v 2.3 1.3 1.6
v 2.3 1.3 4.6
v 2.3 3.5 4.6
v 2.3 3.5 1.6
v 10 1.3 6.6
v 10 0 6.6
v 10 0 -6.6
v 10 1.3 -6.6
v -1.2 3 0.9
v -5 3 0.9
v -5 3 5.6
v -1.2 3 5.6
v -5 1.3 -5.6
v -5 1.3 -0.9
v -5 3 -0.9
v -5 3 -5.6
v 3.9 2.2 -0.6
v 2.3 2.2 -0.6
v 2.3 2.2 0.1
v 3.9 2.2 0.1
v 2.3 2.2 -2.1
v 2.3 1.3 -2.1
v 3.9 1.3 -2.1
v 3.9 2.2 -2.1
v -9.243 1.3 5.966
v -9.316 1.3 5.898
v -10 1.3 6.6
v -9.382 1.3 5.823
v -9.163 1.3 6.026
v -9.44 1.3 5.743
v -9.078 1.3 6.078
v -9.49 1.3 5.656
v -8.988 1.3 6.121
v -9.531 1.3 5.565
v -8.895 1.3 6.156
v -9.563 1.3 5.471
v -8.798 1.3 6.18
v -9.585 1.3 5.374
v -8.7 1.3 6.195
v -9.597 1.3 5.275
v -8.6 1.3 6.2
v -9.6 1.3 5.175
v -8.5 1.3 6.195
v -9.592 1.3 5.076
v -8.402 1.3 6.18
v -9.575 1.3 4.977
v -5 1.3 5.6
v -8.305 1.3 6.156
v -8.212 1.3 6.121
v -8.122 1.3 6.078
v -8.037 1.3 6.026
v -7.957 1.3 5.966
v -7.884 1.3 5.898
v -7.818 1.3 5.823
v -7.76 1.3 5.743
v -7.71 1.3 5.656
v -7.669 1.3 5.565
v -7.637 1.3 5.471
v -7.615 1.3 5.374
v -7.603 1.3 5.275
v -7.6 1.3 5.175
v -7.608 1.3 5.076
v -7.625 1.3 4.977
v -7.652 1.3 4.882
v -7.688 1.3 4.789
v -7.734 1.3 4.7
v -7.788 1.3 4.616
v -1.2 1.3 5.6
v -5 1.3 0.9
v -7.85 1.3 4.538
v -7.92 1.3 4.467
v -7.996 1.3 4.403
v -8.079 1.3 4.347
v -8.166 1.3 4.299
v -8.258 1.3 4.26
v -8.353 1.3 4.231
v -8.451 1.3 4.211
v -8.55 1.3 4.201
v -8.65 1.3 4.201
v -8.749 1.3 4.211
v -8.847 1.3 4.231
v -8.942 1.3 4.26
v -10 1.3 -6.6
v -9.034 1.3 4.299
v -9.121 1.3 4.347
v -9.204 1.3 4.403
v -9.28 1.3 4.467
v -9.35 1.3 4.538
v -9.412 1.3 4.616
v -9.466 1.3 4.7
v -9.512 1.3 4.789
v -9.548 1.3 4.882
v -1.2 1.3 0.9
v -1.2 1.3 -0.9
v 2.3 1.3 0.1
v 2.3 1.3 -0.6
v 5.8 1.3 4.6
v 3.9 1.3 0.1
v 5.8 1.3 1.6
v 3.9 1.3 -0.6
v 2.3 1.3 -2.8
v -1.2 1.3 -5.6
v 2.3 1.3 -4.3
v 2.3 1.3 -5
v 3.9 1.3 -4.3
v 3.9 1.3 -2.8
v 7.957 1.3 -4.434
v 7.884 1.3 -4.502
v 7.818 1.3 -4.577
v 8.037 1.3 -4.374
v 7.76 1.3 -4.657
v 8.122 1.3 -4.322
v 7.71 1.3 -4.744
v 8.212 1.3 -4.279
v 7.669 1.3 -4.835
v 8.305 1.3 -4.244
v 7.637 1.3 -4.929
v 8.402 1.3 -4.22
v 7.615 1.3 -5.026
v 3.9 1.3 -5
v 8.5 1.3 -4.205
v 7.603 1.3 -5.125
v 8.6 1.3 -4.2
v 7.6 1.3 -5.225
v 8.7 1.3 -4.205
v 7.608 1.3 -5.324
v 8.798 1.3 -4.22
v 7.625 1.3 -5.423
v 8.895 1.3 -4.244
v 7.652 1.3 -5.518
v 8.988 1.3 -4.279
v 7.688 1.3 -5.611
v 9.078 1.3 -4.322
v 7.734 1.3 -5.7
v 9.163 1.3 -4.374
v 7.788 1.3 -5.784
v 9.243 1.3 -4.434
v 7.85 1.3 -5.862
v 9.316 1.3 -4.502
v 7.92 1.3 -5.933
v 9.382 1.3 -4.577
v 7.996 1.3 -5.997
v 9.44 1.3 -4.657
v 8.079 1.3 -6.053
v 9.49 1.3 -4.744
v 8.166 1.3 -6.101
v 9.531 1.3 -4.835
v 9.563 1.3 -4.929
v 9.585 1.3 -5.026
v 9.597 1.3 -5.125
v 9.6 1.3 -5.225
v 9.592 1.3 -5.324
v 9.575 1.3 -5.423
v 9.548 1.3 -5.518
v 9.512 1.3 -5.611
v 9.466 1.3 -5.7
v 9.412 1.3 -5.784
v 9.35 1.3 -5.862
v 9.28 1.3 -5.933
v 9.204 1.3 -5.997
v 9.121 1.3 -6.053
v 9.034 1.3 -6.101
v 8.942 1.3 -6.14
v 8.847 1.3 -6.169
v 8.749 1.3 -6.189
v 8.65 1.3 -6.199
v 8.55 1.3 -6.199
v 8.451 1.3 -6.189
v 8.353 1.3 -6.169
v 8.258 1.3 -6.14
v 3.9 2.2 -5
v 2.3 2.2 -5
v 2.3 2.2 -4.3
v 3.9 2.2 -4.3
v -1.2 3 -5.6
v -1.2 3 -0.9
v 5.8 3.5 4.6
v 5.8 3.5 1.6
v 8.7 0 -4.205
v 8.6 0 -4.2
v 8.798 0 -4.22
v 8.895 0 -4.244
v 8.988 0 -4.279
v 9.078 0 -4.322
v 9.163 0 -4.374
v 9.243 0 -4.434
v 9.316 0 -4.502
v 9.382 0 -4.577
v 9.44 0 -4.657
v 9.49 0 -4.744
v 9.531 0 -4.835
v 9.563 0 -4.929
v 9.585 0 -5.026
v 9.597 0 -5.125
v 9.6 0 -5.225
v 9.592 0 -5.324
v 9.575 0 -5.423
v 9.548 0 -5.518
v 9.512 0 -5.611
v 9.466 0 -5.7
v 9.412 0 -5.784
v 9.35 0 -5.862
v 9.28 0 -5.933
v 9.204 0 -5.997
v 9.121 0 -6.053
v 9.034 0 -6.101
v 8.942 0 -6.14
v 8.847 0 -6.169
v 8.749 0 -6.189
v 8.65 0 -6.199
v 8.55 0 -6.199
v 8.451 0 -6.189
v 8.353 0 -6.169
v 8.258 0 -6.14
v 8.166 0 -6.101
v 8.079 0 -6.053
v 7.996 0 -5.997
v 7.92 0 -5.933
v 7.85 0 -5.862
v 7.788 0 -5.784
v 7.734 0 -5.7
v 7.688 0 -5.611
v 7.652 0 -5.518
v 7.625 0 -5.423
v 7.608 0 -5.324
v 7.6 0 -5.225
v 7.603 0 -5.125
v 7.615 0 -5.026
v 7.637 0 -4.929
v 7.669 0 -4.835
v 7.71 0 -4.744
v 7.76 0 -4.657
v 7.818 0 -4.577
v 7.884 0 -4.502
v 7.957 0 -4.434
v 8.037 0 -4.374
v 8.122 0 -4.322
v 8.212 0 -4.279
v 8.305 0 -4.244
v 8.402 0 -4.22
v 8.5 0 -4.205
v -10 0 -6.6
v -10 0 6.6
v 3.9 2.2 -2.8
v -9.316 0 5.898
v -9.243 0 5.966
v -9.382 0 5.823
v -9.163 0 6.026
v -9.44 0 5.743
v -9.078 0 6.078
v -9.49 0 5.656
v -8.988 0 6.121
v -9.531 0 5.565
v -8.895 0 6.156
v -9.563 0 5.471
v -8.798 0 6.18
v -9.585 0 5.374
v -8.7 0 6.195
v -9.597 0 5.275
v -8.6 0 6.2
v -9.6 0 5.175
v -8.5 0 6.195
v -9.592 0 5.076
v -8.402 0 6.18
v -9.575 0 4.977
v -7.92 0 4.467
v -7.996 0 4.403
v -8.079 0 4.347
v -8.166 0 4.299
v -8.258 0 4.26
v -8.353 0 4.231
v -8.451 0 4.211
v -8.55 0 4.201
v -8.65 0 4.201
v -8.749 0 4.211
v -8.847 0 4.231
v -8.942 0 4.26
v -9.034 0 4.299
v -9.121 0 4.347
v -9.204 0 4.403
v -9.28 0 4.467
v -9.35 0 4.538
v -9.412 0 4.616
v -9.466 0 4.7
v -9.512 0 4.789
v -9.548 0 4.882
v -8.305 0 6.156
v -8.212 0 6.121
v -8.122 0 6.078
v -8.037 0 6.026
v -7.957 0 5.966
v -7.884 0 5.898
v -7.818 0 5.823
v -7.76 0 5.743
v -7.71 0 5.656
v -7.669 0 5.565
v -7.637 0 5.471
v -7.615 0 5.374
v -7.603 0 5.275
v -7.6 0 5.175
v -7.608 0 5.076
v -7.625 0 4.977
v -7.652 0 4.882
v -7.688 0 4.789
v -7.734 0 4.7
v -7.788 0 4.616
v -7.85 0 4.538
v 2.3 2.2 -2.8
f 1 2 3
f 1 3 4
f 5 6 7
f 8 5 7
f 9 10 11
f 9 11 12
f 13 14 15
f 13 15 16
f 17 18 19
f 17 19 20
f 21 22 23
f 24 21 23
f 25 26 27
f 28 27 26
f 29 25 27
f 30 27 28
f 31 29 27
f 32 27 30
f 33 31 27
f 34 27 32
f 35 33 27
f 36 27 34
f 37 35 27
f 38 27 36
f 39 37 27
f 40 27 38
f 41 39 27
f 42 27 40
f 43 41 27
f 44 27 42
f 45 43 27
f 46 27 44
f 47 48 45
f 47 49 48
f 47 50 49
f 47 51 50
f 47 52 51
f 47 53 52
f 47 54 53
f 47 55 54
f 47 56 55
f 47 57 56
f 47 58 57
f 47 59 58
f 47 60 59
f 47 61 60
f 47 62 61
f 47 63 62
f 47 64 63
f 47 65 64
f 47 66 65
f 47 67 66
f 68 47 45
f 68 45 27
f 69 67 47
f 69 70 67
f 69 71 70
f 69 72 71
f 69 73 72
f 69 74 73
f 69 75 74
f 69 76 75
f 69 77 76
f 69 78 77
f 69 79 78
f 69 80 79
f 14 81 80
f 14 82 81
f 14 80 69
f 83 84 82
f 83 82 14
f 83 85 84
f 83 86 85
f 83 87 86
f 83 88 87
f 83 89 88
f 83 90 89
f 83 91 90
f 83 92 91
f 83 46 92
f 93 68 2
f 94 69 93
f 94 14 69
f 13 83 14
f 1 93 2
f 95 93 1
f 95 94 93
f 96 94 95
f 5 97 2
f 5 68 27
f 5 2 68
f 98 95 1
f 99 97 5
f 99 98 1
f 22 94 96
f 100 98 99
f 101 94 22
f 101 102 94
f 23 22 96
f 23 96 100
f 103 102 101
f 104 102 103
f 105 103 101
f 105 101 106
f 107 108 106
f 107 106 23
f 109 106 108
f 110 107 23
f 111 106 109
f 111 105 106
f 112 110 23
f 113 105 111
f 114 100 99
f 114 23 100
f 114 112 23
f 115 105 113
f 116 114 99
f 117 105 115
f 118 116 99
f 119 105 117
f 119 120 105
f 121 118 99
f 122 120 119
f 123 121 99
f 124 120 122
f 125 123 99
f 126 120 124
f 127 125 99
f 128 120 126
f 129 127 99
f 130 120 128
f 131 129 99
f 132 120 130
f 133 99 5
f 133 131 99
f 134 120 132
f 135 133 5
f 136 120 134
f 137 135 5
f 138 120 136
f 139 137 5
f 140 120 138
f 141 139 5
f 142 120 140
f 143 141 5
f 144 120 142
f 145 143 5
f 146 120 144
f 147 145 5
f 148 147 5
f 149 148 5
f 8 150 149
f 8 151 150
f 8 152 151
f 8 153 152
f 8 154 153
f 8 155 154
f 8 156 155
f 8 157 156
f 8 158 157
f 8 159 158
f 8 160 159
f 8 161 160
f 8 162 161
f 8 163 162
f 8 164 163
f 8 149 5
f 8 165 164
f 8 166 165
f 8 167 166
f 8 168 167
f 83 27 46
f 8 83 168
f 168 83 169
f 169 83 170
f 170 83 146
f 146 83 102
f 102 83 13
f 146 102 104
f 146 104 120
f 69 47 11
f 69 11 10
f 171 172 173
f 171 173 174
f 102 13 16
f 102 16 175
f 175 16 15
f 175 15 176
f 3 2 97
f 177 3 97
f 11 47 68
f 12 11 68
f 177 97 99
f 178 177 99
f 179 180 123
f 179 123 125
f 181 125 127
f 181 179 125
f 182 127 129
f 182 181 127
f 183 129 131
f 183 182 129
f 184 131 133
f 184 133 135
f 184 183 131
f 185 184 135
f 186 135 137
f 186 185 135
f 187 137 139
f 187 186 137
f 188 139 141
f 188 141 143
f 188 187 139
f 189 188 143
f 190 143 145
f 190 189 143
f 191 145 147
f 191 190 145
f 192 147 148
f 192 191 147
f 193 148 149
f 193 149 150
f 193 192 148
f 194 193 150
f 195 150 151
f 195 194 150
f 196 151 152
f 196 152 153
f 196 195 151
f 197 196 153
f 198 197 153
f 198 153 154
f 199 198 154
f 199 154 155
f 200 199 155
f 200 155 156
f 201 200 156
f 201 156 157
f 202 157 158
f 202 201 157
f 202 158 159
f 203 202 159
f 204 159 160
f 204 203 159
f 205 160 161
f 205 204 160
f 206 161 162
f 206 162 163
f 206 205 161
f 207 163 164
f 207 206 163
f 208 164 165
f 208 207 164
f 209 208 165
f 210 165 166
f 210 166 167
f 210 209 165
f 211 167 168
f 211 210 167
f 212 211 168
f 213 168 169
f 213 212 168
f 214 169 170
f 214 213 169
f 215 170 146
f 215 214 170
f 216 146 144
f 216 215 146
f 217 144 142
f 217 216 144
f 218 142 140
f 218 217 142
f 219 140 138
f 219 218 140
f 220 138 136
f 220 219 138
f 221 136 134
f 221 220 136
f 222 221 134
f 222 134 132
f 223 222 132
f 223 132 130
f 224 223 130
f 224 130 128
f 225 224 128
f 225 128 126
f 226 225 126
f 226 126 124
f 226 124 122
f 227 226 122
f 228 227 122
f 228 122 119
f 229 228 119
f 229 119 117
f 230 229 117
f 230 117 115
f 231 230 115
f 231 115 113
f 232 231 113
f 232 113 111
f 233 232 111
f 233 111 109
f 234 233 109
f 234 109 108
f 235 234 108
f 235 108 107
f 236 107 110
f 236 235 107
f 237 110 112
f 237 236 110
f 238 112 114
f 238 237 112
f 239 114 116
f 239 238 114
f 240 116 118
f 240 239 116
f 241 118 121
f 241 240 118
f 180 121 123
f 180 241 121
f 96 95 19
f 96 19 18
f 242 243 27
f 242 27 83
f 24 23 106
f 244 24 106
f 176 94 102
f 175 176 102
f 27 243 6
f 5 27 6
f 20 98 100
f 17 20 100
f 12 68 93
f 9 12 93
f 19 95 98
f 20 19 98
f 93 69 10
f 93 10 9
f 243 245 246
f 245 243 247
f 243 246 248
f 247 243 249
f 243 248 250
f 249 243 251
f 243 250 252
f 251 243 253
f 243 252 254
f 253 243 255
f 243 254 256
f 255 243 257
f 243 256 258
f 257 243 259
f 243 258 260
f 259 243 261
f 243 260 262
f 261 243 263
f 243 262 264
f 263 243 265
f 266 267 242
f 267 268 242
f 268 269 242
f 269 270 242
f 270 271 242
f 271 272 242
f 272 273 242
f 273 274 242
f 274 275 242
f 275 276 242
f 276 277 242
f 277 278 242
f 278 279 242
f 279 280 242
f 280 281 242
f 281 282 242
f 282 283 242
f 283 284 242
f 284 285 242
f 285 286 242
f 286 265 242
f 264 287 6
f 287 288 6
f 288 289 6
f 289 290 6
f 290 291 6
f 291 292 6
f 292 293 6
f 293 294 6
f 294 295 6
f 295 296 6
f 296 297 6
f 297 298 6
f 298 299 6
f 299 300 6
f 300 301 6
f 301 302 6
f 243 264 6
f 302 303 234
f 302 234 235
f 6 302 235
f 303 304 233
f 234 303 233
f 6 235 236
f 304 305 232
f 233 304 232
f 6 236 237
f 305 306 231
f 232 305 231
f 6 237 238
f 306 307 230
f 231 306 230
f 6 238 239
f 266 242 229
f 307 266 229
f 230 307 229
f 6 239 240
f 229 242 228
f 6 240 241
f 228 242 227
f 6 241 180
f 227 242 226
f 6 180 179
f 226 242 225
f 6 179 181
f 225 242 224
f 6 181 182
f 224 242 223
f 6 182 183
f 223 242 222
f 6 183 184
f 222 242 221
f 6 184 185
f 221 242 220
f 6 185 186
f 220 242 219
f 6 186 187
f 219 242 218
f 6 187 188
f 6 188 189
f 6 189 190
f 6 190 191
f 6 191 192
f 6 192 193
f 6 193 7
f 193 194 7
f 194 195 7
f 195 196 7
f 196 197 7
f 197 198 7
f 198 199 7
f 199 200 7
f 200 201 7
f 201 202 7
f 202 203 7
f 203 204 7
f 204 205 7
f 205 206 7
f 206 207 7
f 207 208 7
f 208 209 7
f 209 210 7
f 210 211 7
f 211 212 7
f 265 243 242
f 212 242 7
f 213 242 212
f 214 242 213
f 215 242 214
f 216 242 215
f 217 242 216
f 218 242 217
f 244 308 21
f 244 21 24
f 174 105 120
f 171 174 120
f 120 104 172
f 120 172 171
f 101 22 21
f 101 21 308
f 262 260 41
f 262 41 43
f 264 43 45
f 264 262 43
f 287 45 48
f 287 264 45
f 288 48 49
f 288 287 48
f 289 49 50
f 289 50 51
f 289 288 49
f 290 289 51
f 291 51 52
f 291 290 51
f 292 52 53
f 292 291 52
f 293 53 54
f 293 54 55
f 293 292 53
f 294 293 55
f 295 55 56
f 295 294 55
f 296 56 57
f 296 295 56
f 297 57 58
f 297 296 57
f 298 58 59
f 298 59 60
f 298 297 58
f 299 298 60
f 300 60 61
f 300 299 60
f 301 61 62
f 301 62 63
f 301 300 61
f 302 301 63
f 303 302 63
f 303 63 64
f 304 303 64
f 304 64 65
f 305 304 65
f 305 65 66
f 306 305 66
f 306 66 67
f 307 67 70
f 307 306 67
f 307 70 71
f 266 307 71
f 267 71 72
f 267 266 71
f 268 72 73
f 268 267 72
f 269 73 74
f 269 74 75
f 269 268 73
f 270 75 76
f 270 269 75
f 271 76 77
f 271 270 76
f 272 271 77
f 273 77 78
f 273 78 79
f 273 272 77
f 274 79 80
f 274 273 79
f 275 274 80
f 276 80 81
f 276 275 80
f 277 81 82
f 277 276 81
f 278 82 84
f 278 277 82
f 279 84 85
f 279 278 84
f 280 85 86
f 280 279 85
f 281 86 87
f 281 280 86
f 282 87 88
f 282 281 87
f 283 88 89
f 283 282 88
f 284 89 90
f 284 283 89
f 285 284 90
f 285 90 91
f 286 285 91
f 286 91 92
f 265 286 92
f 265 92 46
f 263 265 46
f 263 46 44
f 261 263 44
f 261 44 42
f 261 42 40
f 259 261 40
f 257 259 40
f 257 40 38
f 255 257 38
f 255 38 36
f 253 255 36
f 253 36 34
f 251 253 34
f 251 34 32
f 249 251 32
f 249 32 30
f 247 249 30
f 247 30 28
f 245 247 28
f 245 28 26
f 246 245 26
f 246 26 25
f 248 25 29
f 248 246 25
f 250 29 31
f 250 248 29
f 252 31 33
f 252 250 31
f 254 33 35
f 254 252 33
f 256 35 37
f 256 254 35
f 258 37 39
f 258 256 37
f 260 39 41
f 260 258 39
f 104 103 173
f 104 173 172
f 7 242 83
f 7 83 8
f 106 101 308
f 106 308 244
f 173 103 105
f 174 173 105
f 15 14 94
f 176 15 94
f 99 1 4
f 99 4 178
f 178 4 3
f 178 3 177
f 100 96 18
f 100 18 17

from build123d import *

# Parameters (mm, degrees)
SKETCH_1_W      = 20
SKETCH_1_H      = 13.2
SKETCH_1_R      = 1
EXTRUDE_1_DEPTH = 1.3
SKETCH_1_3_W    = 3.8
SKETCH_1_3_H    = 4.7
EXTRUDE_2_DEPTH = 3
SKETCH_1_4_W    = 1.6
SKETCH_1_4_H    = 0.7
EXTRUDE_3_DEPTH = 2.2
SKETCH_1_5_W    = 3.5
SKETCH_1_5_H    = 3
EXTRUDE_4_DEPTH = 3.5


with BuildPart() as part:
    # 草图1 → 凸台-拉伸1 (new body)
    with BuildSketch(Plane(origin=(0, 0, 0), x_dir=(1, 0, 0), z_dir=(0, 1, 0))):
        Rectangle(SKETCH_1_W, SKETCH_1_H)
        with Locations((-8.6, -5.2)):
            Circle(SKETCH_1_R, mode=Mode.SUBTRACT)
        with Locations((8.6, 5.2)):
            Circle(SKETCH_1_R, mode=Mode.SUBTRACT)
    extrude(amount=EXTRUDE_1_DEPTH)

    # 草图1<3> → 凸台-拉伸2 (add)
    with BuildSketch(Plane(origin=(0, 0, 0), x_dir=(1, 0, 0), z_dir=(0, 1, 0))):
        with Locations((-3.1, 3.25)):
            Rectangle(SKETCH_1_3_W, SKETCH_1_3_H)
        with Locations((-3.1, -3.25)):
            Rectangle(SKETCH_1_3_W, SKETCH_1_3_H)
    extrude(amount=EXTRUDE_2_DEPTH)

    # 草图1<4> → 凸台-拉伸3 (add)
    with BuildSketch(Plane(origin=(0, 0, 0), x_dir=(1, 0, 0), z_dir=(0, 1, 0))):
        with Locations((3.1, 4.65)):
            Rectangle(SKETCH_1_4_W, SKETCH_1_4_H)
        with Locations((3.1, 2.45)):
            Rectangle(SKETCH_1_4_W, SKETCH_1_4_H)
        with Locations((3.1, 0.25)):
            Rectangle(SKETCH_1_4_W, SKETCH_1_4_H)
    extrude(amount=EXTRUDE_3_DEPTH)

    # 草图1<5> → 凸台-拉伸4 (add)
    with BuildSketch(Plane(origin=(0, 0, 0), x_dir=(1, 0, 0), z_dir=(0, 1, 0))):
        with Locations((4.05, -3.1)):
            Rectangle(SKETCH_1_5_W, SKETCH_1_5_H)
    extrude(amount=EXTRUDE_4_DEPTH)


solid = part.part
